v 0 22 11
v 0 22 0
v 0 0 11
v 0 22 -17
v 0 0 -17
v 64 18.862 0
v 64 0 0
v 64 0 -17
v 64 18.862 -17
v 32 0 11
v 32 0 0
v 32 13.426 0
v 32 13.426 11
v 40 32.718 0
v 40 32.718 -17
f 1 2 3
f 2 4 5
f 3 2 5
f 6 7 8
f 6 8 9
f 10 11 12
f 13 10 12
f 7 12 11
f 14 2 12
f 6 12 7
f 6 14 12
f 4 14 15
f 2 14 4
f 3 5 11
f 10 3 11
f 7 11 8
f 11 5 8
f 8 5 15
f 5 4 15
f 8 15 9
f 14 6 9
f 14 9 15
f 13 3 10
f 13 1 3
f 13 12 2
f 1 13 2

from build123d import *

# Parameters (mm, degrees)
EXTRUDE_3_DEPTH = 17
EXTRUDE_4_DEPTH = 11


with BuildPart() as part:
    # 草圖3 → 填料-伸長3 (new body)
    with BuildSketch(Plane.XY):
        Polygon((0, 0), (64, 0), (64, 18.861561237), (40, 32.717967697), (0, 22), align=None)
    extrude(amount=-EXTRUDE_3_DEPTH)

    # 草圖4 → 填料-伸長4 (add)
    with BuildSketch(Plane.XY):
        Polygon((0, 0), (32, 0), (32, 13.425625842), (0, 22), align=None)
    extrude(amount=EXTRUDE_4_DEPTH)


solid = part.part
